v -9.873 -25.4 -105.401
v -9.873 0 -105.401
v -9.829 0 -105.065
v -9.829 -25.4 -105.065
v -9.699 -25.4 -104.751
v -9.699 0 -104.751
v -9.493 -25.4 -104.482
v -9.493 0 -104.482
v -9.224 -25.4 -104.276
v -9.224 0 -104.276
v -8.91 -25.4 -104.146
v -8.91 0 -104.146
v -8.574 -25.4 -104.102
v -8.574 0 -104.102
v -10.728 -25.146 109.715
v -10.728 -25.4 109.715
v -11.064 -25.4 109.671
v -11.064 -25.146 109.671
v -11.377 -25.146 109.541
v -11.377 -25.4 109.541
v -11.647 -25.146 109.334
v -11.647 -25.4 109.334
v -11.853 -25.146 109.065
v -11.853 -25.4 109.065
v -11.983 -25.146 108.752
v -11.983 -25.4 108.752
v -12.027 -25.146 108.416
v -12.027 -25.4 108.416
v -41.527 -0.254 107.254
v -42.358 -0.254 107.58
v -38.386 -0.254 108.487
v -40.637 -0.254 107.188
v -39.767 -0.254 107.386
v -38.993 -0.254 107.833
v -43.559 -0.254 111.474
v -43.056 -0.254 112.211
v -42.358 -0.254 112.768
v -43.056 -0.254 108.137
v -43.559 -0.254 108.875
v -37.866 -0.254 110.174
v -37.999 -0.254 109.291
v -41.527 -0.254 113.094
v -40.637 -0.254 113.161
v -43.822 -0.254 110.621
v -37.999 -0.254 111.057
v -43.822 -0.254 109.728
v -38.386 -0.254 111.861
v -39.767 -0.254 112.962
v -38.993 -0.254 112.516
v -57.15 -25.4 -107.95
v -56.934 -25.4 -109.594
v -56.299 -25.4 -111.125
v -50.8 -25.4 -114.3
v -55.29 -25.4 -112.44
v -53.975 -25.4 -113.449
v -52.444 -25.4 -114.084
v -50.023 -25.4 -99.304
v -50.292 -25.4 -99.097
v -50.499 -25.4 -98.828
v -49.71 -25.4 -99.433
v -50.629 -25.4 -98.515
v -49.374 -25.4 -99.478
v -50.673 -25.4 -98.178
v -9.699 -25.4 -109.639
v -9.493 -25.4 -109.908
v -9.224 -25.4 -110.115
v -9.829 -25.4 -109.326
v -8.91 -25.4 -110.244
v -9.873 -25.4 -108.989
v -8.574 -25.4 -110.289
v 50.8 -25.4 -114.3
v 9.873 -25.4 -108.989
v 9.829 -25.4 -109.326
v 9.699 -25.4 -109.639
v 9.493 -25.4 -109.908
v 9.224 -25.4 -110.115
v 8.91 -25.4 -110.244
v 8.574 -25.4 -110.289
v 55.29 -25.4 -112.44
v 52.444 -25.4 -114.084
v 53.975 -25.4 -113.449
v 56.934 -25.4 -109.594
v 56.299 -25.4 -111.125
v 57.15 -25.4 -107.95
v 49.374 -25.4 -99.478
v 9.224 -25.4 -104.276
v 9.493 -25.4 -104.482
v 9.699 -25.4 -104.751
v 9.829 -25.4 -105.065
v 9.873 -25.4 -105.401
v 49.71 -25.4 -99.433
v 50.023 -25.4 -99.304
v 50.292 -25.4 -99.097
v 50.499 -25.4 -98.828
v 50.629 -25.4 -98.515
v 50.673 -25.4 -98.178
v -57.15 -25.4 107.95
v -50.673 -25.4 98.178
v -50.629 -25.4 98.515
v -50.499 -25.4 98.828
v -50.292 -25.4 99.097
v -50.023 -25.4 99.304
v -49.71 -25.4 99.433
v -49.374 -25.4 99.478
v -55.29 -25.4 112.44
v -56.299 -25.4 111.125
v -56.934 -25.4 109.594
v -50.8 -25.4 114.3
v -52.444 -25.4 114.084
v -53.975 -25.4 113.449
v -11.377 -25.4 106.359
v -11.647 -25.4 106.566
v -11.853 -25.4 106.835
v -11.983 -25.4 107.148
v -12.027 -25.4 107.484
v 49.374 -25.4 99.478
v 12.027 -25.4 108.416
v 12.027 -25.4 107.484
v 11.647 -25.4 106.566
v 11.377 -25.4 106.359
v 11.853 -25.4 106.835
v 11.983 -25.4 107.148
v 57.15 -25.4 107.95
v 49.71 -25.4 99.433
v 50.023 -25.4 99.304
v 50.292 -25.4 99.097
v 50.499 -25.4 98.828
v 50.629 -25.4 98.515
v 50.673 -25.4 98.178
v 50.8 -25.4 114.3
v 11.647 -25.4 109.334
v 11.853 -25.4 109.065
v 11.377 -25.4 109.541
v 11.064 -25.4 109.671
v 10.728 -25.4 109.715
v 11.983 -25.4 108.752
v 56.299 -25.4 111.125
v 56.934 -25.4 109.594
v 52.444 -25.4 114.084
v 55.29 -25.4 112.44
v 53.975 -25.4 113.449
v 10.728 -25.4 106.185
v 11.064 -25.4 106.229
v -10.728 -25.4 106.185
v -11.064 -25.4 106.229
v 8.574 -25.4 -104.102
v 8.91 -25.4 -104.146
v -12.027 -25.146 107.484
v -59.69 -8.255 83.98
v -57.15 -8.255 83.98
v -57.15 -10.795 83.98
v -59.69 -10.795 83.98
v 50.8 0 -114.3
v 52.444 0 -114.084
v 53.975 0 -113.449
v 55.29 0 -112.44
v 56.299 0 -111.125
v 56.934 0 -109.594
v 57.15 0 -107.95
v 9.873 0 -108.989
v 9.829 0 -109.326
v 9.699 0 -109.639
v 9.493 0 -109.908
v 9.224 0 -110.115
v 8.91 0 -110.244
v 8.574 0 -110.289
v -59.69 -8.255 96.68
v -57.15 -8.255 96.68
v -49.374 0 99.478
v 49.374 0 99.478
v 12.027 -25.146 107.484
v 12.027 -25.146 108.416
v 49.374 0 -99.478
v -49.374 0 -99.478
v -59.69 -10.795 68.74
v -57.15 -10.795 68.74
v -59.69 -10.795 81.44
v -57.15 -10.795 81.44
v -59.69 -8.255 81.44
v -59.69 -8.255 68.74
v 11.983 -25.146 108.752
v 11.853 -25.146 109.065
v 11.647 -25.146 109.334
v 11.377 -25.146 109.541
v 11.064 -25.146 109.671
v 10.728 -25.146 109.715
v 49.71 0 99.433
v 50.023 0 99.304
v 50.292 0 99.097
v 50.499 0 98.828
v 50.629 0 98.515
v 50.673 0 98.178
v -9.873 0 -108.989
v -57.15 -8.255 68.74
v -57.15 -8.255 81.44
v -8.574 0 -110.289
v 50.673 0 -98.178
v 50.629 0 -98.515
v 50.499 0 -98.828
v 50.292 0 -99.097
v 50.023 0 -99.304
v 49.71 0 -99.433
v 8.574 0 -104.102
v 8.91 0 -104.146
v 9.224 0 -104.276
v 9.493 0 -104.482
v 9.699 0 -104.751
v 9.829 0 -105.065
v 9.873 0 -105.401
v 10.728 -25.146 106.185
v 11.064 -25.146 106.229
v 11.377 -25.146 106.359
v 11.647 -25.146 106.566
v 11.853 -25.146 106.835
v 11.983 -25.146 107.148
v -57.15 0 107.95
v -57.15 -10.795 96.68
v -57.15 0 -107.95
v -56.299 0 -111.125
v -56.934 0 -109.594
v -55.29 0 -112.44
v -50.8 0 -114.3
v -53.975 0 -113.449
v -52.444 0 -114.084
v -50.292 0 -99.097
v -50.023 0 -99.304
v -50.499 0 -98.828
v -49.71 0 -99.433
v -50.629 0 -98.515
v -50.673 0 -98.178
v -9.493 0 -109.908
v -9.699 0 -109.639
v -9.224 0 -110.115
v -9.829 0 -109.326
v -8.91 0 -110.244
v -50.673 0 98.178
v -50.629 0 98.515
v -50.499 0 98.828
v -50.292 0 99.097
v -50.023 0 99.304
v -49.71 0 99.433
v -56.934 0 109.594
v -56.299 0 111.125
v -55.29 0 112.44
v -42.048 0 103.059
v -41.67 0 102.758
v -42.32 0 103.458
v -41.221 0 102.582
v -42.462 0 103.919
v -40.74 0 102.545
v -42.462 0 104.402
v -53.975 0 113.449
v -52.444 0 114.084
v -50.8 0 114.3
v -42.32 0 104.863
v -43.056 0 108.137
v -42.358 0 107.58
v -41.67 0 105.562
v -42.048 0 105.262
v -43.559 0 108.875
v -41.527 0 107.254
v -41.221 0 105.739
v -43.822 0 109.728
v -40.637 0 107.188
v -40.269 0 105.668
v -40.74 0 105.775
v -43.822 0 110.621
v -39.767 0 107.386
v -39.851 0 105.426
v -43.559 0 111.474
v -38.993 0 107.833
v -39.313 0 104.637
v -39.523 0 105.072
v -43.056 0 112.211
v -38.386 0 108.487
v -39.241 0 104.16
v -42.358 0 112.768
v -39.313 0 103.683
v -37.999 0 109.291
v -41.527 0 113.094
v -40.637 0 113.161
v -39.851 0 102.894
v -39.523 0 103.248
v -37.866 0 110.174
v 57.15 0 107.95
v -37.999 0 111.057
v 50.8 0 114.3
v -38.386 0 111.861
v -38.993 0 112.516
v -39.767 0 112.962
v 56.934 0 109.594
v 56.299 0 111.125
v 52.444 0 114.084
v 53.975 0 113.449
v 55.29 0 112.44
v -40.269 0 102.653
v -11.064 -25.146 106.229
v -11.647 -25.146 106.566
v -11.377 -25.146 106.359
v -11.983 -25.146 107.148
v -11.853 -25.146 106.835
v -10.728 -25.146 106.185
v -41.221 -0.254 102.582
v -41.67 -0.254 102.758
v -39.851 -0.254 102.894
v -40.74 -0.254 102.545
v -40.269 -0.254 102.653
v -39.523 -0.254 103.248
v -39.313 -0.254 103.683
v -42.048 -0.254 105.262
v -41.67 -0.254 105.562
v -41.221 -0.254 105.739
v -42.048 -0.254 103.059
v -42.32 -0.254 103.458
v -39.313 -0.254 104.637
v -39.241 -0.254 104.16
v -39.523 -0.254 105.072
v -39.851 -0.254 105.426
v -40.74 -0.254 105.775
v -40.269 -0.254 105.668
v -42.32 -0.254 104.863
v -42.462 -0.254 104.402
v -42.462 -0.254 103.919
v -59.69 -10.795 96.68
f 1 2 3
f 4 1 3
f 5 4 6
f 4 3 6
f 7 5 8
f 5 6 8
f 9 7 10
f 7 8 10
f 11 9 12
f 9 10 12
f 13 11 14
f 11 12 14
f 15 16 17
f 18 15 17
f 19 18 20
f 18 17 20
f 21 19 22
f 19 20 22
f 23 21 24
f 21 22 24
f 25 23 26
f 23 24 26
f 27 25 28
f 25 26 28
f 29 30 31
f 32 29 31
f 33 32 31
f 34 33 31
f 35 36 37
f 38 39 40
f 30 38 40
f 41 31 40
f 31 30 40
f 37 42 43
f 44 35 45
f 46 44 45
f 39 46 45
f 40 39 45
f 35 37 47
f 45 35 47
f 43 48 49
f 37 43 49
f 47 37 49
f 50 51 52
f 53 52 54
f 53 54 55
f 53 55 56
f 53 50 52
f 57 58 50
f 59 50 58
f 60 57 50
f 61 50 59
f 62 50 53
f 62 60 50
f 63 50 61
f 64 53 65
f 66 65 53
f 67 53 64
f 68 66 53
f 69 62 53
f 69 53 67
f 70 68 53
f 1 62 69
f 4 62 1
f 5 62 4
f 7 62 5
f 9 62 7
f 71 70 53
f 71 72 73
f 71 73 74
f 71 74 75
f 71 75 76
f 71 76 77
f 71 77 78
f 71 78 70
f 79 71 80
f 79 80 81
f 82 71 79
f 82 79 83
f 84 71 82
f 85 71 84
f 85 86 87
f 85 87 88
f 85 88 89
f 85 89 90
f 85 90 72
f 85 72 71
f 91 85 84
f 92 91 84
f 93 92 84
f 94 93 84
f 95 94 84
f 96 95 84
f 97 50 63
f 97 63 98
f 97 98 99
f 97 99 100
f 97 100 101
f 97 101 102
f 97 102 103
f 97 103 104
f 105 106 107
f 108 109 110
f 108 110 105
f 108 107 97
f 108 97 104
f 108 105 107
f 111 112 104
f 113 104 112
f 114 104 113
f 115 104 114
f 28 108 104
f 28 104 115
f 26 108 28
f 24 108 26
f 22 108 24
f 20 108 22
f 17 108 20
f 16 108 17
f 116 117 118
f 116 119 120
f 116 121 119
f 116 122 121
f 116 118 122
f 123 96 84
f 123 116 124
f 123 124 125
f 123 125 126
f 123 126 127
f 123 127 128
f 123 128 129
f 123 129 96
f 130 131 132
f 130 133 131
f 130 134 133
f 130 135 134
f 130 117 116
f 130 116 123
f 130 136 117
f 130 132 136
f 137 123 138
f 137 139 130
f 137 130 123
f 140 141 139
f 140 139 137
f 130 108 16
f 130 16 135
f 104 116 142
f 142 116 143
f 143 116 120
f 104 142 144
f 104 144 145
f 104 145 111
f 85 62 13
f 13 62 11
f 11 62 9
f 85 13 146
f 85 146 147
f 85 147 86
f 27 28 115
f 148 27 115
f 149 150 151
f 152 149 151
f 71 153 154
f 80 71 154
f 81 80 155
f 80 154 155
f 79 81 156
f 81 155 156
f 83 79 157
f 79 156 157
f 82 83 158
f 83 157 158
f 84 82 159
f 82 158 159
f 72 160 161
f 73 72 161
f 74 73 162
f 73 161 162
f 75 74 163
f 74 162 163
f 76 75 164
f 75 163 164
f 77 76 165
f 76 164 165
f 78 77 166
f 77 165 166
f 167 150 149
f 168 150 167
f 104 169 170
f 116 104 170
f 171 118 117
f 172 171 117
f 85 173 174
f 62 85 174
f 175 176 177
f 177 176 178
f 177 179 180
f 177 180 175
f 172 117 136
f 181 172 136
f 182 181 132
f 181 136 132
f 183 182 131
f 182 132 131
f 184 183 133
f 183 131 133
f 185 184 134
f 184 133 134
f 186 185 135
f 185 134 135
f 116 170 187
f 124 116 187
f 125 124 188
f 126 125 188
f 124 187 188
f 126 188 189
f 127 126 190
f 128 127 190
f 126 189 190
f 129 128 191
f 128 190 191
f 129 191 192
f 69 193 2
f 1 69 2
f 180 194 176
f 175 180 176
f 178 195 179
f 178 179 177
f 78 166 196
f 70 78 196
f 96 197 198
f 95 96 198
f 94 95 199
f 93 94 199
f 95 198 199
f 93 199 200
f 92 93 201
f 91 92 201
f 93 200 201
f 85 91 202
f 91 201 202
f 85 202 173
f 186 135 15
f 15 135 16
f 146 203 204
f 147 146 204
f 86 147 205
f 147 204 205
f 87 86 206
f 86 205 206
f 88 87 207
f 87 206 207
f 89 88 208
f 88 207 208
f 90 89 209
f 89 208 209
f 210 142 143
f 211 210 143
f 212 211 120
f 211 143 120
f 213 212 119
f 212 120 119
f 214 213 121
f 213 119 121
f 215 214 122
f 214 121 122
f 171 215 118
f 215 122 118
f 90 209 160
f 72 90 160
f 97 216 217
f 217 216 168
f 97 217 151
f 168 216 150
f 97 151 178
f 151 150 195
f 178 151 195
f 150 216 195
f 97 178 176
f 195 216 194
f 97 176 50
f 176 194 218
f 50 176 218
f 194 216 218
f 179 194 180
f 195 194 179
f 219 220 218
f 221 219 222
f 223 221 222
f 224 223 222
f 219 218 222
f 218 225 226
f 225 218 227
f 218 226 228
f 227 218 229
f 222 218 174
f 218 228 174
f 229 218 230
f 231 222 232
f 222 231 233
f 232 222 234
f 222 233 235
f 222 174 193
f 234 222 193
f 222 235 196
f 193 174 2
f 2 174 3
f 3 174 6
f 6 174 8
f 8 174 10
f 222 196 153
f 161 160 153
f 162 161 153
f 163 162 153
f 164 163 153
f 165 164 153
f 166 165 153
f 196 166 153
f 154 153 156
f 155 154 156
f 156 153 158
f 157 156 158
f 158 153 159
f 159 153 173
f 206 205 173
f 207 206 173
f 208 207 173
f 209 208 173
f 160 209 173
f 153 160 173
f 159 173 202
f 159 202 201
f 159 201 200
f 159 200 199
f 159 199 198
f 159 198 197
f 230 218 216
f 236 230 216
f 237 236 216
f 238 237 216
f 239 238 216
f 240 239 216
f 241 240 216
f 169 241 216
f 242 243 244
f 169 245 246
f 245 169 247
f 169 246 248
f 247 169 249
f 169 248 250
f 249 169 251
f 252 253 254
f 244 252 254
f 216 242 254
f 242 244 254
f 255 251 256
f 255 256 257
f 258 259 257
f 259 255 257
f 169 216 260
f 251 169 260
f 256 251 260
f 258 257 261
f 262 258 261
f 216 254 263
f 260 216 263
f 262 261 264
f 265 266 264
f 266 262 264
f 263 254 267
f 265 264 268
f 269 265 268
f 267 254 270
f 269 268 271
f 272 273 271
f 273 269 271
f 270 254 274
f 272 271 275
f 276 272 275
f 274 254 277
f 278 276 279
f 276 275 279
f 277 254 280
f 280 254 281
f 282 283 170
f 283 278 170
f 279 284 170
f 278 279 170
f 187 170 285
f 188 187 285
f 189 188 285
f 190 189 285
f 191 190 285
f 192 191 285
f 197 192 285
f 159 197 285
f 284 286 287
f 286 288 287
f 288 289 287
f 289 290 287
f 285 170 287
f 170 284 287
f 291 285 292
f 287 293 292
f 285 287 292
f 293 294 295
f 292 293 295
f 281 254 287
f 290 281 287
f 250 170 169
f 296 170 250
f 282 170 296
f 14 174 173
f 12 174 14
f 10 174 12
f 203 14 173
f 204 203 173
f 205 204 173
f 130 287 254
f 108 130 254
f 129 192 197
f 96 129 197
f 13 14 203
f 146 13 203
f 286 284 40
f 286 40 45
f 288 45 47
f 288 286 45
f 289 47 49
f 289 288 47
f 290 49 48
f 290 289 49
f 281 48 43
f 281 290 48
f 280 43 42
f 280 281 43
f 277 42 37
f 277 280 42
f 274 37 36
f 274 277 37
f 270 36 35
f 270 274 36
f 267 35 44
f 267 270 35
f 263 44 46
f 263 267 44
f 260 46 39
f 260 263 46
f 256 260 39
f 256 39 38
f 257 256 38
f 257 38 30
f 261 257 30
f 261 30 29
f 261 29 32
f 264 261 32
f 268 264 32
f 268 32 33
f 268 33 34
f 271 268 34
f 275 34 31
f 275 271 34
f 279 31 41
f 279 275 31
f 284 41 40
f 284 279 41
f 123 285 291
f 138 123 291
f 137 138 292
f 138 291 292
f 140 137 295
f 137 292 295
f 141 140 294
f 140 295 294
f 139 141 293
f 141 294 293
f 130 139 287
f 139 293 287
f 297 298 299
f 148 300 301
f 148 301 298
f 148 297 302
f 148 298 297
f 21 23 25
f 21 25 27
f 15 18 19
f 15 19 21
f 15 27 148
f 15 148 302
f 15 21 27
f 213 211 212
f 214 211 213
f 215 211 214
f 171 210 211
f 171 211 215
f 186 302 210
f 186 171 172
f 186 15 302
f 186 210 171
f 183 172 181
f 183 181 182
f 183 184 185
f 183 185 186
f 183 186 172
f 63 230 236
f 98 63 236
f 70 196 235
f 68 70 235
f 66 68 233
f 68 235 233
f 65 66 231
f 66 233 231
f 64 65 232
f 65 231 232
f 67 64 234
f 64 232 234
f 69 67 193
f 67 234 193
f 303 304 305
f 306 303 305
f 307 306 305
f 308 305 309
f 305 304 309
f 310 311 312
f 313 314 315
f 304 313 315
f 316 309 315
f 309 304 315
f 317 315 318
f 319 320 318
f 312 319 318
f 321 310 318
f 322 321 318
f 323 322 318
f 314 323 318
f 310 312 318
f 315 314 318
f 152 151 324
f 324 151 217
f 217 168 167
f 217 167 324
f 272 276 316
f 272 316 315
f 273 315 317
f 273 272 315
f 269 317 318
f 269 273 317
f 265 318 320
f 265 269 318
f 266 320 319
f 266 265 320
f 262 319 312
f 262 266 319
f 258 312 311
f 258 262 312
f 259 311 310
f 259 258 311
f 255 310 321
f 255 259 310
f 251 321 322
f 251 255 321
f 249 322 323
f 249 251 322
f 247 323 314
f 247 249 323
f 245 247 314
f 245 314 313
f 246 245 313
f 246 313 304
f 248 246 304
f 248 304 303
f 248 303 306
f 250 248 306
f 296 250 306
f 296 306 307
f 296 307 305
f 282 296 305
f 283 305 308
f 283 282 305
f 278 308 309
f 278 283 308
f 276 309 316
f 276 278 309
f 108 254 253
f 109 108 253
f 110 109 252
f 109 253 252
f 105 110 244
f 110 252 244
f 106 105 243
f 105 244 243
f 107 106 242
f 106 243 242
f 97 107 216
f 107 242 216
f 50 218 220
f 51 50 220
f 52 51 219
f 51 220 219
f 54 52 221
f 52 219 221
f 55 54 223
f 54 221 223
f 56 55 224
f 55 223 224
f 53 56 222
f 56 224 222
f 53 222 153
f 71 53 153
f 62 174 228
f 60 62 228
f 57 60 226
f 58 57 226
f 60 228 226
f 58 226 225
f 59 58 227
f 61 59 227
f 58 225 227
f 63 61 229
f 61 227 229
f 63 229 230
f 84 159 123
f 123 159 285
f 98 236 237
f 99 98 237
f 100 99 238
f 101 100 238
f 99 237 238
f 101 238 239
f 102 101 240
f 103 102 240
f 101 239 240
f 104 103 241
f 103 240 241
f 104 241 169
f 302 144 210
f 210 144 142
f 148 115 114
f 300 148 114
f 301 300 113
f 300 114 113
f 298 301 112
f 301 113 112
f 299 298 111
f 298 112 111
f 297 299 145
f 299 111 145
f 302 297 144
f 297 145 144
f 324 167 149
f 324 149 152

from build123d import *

# Parameters (mm, degrees)
F1_DEPTH = 19.05
F2_W     = 2.54
F2_H     = 12.7
F3_DEPTH = 2.54
F4_DEPTH = 25.4
F5_DEPTH = 25.4
F7_DEPTH = 0.254
F8_R     = 2.995029
F8_R_2   = 1.619254
F9_DEPTH = 0.254


with BuildPart() as f1:
    # F0 (on Front) → F1 (new body)
    with BuildSketch(Plane.XZ):
        with BuildLine():
            Line((50.8, 114.3), (-50.8, 114.3))
            ThreePointArc((-50.8, 114.3), (-55.290128, 112.440128), (-57.15, 107.95))
            Line((-57.15, 107.95), (-57.15, -107.95))
            ThreePointArc((-57.15, -107.95), (-55.290128, -112.440128), (-50.8, -114.3))
            Line((-50.8, -114.3), (50.8, -114.3))
            ThreePointArc((50.8, -114.3), (55.290128, -112.440128), (57.15, -107.95))
            Line((57.15, -107.95), (57.15, 107.95))
            ThreePointArc((57.15, 107.95), (55.290128, 112.440128), (50.8, 114.3))
        make_face()
        with BuildLine():
            ThreePointArc((-9.873155, -105.40096), (-9.492607, -104.482236), (-8.573882, -104.101688))
            Line((-8.573882, -104.101688), (8.573882, -104.101688))
            ThreePointArc((8.573882, -104.101688), (9.492607, -104.482236), (9.873155, -105.40096))
            Line((9.873155, -105.40096), (9.873155, -108.98943))
            ThreePointArc((9.873155, -108.98943), (9.492607, -109.908154), (8.573882, -110.288702))
            Line((8.573882, -110.288702), (-8.573882, -110.288702))
            ThreePointArc((-8.573882, -110.288702), (-9.492607, -109.908154), (-9.873155, -108.98943))
            Line((-9.873155, -108.98943), (-9.873155, -105.40096))
        make_face(mode=Mode.SUBTRACT)
        with BuildLine():
            ThreePointArc((-50.673, 98.178406), (-50.292452, 99.09713), (-49.373728, 99.477679))
            Line((-49.373728, 99.477679), (49.373728, 99.477679))
            ThreePointArc((49.373728, 99.477679), (50.292452, 99.09713), (50.673, 98.178406))
            Line((50.673, 98.178406), (50.673, -98.178406))
            ThreePointArc((50.673, -98.178406), (50.292452, -99.09713), (49.373728, -99.477679))
            Line((49.373728, -99.477679), (-49.373728, -99.477679))
            ThreePointArc((-49.373728, -99.477679), (-50.292452, -99.09713), (-50.673, -98.178406))
            Line((-50.673, -98.178406), (-50.673, 98.178406))
        make_face(mode=Mode.SUBTRACT)
    extrude(amount=F1_DEPTH)

    # F2 (on face) → F3 (join)
    with BuildSketch(Plane(origin=(-57.15, 0, 0), x_dir=(0, -1, 0), z_dir=(-1, 0, 0))):
        with Locations((9.525, 90.329596)):
            Rectangle(F2_W, F2_H)
        with Locations((9.525, 75.089596)):
            Rectangle(F2_W, F2_H)
    extrude(amount=F3_DEPTH)

    # F0 (on Front) → F4 (join)
    with BuildSketch(Plane.XZ):
        with BuildLine():
            Line((50.8, 114.3), (-50.8, 114.3))
            ThreePointArc((-50.8, 114.3), (-55.290128, 112.440128), (-57.15, 107.95))
            Line((-57.15, 107.95), (-57.15, -107.95))
            ThreePointArc((-57.15, -107.95), (-55.290128, -112.440128), (-50.8, -114.3))
            Line((-50.8, -114.3), (50.8, -114.3))
            ThreePointArc((50.8, -114.3), (55.290128, -112.440128), (57.15, -107.95))
            Line((57.15, -107.95), (57.15, 107.95))
            ThreePointArc((57.15, 107.95), (55.290128, 112.440128), (50.8, 114.3))
        make_face()
        with BuildLine():
            ThreePointArc((-9.873155, -105.40096), (-9.492607, -104.482236), (-8.573882, -104.101688))
            Line((-8.573882, -104.101688), (8.573882, -104.101688))
            ThreePointArc((8.573882, -104.101688), (9.492607, -104.482236), (9.873155, -105.40096))
            Line((9.873155, -105.40096), (9.873155, -108.98943))
            ThreePointArc((9.873155, -108.98943), (9.492607, -109.908154), (8.573882, -110.288702))
            Line((8.573882, -110.288702), (-8.573882, -110.288702))
            ThreePointArc((-8.573882, -110.288702), (-9.492607, -109.908154), (-9.873155, -108.98943))
            Line((-9.873155, -108.98943), (-9.873155, -105.40096))
        make_face(mode=Mode.SUBTRACT)
        with BuildLine():
            ThreePointArc((-50.673, 98.178406), (-50.292452, 99.09713), (-49.373728, 99.477679))
            Line((-49.373728, 99.477679), (49.373728, 99.477679))
            ThreePointArc((49.373728, 99.477679), (50.292452, 99.09713), (50.673, 98.178406))
            Line((50.673, 98.178406), (50.673, -98.178406))
            ThreePointArc((50.673, -98.178406), (50.292452, -99.09713), (49.373728, -99.477679))
            Line((49.373728, -99.477679), (-49.373728, -99.477679))
            ThreePointArc((-49.373728, -99.477679), (-50.292452, -99.09713), (-50.673, -98.178406))
            Line((-50.673, -98.178406), (-50.673, 98.178406))
        make_face(mode=Mode.SUBTRACT)
    extrude(amount=F4_DEPTH)

    # F0 (on Front) → F5 (join)
    with BuildSketch(Plane.XZ):
        with BuildLine():
            Line((50.8, 114.3), (-50.8, 114.3))
            ThreePointArc((-50.8, 114.3), (-55.290128, 112.440128), (-57.15, 107.95))
            Line((-57.15, 107.95), (-57.15, -107.95))
            ThreePointArc((-57.15, -107.95), (-55.290128, -112.440128), (-50.8, -114.3))
            Line((-50.8, -114.3), (50.8, -114.3))
            ThreePointArc((50.8, -114.3), (55.290128, -112.440128), (57.15, -107.95))
            Line((57.15, -107.95), (57.15, 107.95))
            ThreePointArc((57.15, 107.95), (55.290128, 112.440128), (50.8, 114.3))
        make_face()
        with BuildLine():
            ThreePointArc((-9.873155, -105.40096), (-9.492607, -104.482236), (-8.573882, -104.101688))
            Line((-8.573882, -104.101688), (8.573882, -104.101688))
            ThreePointArc((8.573882, -104.101688), (9.492607, -104.482236), (9.873155, -105.40096))
            Line((9.873155, -105.40096), (9.873155, -108.98943))
            ThreePointArc((9.873155, -108.98943), (9.492607, -109.908154), (8.573882, -110.288702))
            Line((8.573882, -110.288702), (-8.573882, -110.288702))
            ThreePointArc((-8.573882, -110.288702), (-9.492607, -109.908154), (-9.873155, -108.98943))
            Line((-9.873155, -108.98943), (-9.873155, -105.40096))
        make_face(mode=Mode.SUBTRACT)
        with BuildLine():
            ThreePointArc((-50.673, 98.178406), (-50.292452, 99.09713), (-49.373728, 99.477679))
            Line((-49.373728, 99.477679), (49.373728, 99.477679))
            ThreePointArc((49.373728, 99.477679), (50.292452, 99.09713), (50.673, 98.178406))
            Line((50.673, 98.178406), (50.673, -98.178406))
            ThreePointArc((50.673, -98.178406), (50.292452, -99.09713), (49.373728, -99.477679))
            Line((49.373728, -99.477679), (-49.373728, -99.477679))
            ThreePointArc((-49.373728, -99.477679), (-50.292452, -99.09713), (-50.673, -98.178406))
            Line((-50.673, -98.178406), (-50.673, 98.178406))
        make_face(mode=Mode.SUBTRACT)
    extrude(amount=F5_DEPTH)

    # F6 (on face) → F7 (cut)
    with BuildSketch(Plane.XZ.offset(25.4)):
        with BuildLine():
            ThreePointArc((-12.027082, 107.484314), (-11.646534, 106.565589), (-10.72781, 106.185041))
            Line((-10.72781, 106.185041), (10.72781, 106.185041))
            ThreePointArc((10.72781, 106.185041), (11.646534, 106.565589), (12.027082, 107.484314))
            Line((12.027082, 107.484314), (12.027082, 108.415686))
            ThreePointArc((12.027082, 108.415686), (11.646534, 109.334411), (10.72781, 109.714959))
            Line((10.72781, 109.714959), (-10.72781, 109.714959))
            ThreePointArc((-10.72781, 109.714959), (-11.646534, 109.334411), (-12.027082, 108.415686))
            Line((-12.027082, 108.415686), (-12.027082, 107.484314))
        make_face()
    extrude(amount=-F7_DEPTH, mode=Mode.SUBTRACT)

    # F8 (on face) → F9 (cut)
    with BuildSketch(Plane.XZ):
        with Locations((-40.86072, 110.174194)):
            Circle(F8_R)
        with Locations((-40.86072, 104.160182)):
            Circle(F8_R_2)
    extrude(amount=F9_DEPTH, mode=Mode.SUBTRACT)


solid = f1.part
